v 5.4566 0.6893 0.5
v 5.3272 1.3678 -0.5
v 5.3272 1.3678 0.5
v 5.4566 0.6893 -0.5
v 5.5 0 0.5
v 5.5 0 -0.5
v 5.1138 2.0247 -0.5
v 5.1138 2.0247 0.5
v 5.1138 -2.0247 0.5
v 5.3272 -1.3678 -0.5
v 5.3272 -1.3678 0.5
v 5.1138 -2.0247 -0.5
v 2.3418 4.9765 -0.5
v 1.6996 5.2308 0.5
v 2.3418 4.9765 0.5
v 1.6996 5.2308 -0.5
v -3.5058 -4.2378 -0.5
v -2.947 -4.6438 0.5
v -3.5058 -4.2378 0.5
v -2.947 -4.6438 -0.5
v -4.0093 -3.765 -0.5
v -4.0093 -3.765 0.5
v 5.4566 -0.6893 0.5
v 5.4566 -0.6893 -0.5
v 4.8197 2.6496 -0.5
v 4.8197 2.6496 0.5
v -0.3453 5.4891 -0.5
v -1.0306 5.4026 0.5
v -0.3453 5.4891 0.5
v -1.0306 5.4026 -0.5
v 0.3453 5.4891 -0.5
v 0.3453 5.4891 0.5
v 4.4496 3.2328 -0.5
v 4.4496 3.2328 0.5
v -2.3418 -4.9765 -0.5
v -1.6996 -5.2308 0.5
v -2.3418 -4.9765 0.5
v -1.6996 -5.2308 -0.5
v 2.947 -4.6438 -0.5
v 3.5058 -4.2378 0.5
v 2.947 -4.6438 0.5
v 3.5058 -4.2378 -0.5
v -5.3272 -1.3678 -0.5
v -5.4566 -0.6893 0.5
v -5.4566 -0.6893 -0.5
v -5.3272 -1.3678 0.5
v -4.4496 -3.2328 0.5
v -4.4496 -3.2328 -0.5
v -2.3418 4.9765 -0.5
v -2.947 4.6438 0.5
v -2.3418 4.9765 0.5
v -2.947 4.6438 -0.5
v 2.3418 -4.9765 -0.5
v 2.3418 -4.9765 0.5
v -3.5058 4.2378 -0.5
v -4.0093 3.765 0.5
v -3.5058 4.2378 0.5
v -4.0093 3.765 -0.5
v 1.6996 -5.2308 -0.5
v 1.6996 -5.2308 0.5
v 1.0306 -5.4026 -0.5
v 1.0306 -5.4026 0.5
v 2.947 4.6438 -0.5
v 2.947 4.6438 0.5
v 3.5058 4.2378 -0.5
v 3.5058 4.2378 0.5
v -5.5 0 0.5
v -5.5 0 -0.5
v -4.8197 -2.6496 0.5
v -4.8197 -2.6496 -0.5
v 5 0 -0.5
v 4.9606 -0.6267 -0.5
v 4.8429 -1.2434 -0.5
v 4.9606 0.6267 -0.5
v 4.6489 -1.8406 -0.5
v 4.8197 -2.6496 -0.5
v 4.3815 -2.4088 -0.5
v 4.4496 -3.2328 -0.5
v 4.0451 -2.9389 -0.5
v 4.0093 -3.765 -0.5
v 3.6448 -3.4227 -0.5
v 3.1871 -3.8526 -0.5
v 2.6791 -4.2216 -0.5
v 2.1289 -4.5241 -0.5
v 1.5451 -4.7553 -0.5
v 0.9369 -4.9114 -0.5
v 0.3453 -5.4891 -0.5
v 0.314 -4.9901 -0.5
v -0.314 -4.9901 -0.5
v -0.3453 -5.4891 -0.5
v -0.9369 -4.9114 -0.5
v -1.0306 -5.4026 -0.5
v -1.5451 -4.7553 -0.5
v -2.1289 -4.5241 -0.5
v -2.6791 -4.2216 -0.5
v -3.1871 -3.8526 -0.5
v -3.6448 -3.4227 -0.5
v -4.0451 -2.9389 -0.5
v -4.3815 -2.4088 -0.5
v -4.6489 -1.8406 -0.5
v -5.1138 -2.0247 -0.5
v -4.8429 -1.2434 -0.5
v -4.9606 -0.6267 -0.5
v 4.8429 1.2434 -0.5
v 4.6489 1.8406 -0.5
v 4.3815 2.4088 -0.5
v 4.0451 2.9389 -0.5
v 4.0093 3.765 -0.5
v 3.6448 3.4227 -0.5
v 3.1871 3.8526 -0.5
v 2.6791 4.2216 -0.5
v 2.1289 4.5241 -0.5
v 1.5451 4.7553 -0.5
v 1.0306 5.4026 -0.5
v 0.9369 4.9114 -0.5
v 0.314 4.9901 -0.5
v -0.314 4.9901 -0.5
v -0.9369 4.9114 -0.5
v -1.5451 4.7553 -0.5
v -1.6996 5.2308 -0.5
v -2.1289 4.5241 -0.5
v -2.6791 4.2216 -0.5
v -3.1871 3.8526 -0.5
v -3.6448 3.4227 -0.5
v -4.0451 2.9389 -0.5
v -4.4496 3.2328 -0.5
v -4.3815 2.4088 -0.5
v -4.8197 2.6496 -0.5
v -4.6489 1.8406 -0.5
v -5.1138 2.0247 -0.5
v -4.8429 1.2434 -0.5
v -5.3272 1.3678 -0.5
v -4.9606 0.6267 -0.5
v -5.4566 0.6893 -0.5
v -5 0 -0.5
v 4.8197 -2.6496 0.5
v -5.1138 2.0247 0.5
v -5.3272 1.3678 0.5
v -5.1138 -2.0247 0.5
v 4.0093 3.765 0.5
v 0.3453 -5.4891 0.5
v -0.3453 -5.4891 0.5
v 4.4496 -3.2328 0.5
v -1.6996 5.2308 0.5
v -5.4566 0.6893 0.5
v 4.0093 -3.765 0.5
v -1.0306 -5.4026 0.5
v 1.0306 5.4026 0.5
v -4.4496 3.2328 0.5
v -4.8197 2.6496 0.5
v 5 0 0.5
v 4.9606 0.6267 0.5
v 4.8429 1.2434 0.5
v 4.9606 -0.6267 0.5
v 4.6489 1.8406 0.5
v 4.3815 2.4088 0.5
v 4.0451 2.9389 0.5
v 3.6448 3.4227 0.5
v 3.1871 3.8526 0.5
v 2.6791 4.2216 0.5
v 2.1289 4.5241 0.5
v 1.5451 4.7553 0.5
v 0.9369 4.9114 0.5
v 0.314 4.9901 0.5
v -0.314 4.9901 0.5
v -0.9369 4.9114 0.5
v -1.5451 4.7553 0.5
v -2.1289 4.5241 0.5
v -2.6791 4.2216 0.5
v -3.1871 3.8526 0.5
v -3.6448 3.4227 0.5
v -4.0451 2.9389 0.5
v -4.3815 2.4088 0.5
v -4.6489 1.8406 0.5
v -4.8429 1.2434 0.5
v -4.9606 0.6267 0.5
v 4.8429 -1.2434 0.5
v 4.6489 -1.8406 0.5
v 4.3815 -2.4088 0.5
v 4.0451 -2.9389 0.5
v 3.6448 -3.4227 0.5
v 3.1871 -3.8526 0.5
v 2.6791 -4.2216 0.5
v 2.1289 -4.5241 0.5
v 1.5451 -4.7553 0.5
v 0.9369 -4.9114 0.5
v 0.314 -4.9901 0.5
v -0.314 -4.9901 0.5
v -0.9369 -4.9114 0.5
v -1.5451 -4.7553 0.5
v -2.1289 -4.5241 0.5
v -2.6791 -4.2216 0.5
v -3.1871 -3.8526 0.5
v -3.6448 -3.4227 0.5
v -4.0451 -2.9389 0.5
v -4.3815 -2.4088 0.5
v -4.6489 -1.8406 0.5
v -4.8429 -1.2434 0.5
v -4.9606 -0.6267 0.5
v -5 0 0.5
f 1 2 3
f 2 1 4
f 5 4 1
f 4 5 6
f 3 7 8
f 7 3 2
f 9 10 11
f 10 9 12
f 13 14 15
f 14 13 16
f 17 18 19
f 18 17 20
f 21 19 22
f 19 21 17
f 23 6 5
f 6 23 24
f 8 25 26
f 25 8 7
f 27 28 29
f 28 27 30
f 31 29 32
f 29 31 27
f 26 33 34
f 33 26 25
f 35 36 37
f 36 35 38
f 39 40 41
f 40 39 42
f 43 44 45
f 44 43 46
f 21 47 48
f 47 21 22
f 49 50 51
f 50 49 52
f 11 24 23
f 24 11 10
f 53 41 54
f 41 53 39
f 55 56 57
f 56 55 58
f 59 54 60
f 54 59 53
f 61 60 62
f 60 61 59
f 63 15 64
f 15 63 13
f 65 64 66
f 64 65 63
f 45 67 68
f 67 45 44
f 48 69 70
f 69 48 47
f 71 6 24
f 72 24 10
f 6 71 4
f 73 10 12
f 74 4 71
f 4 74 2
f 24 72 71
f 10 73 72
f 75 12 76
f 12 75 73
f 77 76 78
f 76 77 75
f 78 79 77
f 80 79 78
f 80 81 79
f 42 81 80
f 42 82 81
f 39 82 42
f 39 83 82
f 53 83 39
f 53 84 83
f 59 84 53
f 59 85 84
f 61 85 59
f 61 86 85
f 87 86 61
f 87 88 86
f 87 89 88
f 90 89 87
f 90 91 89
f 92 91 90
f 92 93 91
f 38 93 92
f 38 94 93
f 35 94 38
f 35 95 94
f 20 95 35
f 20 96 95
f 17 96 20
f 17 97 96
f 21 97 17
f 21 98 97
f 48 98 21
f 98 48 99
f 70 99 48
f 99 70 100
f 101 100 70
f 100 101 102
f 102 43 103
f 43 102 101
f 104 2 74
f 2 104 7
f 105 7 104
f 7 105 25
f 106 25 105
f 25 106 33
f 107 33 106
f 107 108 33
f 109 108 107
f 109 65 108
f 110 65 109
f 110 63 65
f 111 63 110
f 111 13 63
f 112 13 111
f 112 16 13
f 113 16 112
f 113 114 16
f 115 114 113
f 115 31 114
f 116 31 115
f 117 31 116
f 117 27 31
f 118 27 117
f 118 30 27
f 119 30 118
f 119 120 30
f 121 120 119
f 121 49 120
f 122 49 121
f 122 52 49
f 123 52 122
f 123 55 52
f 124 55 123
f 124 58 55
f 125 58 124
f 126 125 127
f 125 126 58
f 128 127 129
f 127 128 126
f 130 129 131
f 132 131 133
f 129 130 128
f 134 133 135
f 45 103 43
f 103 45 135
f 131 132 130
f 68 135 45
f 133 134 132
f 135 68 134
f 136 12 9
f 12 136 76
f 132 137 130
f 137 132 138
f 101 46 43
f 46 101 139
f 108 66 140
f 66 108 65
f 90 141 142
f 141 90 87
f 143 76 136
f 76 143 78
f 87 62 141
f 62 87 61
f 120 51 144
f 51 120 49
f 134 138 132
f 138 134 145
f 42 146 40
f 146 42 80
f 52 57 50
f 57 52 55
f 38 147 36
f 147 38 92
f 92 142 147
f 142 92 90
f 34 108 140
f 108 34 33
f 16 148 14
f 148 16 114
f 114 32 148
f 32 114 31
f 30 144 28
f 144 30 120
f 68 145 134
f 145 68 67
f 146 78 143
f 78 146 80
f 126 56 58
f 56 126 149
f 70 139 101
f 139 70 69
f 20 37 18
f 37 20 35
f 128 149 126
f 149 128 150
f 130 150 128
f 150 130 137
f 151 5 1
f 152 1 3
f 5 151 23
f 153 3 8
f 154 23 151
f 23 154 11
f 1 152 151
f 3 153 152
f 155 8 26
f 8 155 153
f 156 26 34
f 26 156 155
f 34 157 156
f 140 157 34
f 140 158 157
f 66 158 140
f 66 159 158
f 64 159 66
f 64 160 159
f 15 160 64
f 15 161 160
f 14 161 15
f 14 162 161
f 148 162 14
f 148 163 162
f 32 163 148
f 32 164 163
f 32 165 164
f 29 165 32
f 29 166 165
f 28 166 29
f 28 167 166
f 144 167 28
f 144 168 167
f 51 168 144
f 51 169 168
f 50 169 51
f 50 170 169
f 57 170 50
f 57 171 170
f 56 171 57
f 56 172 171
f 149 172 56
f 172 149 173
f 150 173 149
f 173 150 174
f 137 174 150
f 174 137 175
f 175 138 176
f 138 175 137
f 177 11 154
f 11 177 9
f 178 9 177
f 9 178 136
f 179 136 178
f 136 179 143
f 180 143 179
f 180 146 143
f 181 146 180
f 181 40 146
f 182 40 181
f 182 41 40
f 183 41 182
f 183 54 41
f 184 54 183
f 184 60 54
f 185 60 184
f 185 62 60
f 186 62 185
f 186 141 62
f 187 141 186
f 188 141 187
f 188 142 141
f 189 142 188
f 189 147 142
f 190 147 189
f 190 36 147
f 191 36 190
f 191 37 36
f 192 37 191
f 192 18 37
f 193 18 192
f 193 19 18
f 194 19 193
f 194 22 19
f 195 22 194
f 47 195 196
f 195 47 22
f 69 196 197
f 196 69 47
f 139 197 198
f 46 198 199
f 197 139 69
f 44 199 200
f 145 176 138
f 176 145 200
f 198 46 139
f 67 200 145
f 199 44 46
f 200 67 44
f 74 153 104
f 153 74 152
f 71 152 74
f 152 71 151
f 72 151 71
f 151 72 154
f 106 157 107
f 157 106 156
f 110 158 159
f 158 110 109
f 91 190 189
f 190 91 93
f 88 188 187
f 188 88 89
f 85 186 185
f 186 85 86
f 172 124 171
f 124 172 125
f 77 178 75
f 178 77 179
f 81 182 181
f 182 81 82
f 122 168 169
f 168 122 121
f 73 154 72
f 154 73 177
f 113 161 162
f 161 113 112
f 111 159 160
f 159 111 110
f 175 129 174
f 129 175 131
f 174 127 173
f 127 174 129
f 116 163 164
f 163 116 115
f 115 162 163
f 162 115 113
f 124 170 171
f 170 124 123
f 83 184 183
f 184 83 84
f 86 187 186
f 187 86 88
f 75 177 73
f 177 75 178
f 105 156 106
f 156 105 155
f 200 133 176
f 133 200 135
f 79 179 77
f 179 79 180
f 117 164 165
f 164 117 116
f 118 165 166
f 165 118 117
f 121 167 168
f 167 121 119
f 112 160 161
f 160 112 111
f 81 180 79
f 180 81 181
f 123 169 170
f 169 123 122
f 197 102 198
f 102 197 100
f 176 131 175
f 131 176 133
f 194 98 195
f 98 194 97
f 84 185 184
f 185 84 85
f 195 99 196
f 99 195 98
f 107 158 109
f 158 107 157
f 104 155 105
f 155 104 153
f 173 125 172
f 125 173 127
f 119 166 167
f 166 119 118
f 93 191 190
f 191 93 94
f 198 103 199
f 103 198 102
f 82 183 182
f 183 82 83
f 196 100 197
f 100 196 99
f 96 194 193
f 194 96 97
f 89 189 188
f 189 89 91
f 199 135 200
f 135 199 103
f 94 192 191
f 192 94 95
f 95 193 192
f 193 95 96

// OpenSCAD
$fn = 50;


difference() {
	union() {
		translate(v = [0, 0, -0.5000000000]) {
			cylinder(h = 1, r = 5.5000000000);
		}
	}
	union() {
		translate(v = [0, 0, -100.0000000000]) {
			cylinder(h = 200, r = 5.0000000000);
		}
	}
}
